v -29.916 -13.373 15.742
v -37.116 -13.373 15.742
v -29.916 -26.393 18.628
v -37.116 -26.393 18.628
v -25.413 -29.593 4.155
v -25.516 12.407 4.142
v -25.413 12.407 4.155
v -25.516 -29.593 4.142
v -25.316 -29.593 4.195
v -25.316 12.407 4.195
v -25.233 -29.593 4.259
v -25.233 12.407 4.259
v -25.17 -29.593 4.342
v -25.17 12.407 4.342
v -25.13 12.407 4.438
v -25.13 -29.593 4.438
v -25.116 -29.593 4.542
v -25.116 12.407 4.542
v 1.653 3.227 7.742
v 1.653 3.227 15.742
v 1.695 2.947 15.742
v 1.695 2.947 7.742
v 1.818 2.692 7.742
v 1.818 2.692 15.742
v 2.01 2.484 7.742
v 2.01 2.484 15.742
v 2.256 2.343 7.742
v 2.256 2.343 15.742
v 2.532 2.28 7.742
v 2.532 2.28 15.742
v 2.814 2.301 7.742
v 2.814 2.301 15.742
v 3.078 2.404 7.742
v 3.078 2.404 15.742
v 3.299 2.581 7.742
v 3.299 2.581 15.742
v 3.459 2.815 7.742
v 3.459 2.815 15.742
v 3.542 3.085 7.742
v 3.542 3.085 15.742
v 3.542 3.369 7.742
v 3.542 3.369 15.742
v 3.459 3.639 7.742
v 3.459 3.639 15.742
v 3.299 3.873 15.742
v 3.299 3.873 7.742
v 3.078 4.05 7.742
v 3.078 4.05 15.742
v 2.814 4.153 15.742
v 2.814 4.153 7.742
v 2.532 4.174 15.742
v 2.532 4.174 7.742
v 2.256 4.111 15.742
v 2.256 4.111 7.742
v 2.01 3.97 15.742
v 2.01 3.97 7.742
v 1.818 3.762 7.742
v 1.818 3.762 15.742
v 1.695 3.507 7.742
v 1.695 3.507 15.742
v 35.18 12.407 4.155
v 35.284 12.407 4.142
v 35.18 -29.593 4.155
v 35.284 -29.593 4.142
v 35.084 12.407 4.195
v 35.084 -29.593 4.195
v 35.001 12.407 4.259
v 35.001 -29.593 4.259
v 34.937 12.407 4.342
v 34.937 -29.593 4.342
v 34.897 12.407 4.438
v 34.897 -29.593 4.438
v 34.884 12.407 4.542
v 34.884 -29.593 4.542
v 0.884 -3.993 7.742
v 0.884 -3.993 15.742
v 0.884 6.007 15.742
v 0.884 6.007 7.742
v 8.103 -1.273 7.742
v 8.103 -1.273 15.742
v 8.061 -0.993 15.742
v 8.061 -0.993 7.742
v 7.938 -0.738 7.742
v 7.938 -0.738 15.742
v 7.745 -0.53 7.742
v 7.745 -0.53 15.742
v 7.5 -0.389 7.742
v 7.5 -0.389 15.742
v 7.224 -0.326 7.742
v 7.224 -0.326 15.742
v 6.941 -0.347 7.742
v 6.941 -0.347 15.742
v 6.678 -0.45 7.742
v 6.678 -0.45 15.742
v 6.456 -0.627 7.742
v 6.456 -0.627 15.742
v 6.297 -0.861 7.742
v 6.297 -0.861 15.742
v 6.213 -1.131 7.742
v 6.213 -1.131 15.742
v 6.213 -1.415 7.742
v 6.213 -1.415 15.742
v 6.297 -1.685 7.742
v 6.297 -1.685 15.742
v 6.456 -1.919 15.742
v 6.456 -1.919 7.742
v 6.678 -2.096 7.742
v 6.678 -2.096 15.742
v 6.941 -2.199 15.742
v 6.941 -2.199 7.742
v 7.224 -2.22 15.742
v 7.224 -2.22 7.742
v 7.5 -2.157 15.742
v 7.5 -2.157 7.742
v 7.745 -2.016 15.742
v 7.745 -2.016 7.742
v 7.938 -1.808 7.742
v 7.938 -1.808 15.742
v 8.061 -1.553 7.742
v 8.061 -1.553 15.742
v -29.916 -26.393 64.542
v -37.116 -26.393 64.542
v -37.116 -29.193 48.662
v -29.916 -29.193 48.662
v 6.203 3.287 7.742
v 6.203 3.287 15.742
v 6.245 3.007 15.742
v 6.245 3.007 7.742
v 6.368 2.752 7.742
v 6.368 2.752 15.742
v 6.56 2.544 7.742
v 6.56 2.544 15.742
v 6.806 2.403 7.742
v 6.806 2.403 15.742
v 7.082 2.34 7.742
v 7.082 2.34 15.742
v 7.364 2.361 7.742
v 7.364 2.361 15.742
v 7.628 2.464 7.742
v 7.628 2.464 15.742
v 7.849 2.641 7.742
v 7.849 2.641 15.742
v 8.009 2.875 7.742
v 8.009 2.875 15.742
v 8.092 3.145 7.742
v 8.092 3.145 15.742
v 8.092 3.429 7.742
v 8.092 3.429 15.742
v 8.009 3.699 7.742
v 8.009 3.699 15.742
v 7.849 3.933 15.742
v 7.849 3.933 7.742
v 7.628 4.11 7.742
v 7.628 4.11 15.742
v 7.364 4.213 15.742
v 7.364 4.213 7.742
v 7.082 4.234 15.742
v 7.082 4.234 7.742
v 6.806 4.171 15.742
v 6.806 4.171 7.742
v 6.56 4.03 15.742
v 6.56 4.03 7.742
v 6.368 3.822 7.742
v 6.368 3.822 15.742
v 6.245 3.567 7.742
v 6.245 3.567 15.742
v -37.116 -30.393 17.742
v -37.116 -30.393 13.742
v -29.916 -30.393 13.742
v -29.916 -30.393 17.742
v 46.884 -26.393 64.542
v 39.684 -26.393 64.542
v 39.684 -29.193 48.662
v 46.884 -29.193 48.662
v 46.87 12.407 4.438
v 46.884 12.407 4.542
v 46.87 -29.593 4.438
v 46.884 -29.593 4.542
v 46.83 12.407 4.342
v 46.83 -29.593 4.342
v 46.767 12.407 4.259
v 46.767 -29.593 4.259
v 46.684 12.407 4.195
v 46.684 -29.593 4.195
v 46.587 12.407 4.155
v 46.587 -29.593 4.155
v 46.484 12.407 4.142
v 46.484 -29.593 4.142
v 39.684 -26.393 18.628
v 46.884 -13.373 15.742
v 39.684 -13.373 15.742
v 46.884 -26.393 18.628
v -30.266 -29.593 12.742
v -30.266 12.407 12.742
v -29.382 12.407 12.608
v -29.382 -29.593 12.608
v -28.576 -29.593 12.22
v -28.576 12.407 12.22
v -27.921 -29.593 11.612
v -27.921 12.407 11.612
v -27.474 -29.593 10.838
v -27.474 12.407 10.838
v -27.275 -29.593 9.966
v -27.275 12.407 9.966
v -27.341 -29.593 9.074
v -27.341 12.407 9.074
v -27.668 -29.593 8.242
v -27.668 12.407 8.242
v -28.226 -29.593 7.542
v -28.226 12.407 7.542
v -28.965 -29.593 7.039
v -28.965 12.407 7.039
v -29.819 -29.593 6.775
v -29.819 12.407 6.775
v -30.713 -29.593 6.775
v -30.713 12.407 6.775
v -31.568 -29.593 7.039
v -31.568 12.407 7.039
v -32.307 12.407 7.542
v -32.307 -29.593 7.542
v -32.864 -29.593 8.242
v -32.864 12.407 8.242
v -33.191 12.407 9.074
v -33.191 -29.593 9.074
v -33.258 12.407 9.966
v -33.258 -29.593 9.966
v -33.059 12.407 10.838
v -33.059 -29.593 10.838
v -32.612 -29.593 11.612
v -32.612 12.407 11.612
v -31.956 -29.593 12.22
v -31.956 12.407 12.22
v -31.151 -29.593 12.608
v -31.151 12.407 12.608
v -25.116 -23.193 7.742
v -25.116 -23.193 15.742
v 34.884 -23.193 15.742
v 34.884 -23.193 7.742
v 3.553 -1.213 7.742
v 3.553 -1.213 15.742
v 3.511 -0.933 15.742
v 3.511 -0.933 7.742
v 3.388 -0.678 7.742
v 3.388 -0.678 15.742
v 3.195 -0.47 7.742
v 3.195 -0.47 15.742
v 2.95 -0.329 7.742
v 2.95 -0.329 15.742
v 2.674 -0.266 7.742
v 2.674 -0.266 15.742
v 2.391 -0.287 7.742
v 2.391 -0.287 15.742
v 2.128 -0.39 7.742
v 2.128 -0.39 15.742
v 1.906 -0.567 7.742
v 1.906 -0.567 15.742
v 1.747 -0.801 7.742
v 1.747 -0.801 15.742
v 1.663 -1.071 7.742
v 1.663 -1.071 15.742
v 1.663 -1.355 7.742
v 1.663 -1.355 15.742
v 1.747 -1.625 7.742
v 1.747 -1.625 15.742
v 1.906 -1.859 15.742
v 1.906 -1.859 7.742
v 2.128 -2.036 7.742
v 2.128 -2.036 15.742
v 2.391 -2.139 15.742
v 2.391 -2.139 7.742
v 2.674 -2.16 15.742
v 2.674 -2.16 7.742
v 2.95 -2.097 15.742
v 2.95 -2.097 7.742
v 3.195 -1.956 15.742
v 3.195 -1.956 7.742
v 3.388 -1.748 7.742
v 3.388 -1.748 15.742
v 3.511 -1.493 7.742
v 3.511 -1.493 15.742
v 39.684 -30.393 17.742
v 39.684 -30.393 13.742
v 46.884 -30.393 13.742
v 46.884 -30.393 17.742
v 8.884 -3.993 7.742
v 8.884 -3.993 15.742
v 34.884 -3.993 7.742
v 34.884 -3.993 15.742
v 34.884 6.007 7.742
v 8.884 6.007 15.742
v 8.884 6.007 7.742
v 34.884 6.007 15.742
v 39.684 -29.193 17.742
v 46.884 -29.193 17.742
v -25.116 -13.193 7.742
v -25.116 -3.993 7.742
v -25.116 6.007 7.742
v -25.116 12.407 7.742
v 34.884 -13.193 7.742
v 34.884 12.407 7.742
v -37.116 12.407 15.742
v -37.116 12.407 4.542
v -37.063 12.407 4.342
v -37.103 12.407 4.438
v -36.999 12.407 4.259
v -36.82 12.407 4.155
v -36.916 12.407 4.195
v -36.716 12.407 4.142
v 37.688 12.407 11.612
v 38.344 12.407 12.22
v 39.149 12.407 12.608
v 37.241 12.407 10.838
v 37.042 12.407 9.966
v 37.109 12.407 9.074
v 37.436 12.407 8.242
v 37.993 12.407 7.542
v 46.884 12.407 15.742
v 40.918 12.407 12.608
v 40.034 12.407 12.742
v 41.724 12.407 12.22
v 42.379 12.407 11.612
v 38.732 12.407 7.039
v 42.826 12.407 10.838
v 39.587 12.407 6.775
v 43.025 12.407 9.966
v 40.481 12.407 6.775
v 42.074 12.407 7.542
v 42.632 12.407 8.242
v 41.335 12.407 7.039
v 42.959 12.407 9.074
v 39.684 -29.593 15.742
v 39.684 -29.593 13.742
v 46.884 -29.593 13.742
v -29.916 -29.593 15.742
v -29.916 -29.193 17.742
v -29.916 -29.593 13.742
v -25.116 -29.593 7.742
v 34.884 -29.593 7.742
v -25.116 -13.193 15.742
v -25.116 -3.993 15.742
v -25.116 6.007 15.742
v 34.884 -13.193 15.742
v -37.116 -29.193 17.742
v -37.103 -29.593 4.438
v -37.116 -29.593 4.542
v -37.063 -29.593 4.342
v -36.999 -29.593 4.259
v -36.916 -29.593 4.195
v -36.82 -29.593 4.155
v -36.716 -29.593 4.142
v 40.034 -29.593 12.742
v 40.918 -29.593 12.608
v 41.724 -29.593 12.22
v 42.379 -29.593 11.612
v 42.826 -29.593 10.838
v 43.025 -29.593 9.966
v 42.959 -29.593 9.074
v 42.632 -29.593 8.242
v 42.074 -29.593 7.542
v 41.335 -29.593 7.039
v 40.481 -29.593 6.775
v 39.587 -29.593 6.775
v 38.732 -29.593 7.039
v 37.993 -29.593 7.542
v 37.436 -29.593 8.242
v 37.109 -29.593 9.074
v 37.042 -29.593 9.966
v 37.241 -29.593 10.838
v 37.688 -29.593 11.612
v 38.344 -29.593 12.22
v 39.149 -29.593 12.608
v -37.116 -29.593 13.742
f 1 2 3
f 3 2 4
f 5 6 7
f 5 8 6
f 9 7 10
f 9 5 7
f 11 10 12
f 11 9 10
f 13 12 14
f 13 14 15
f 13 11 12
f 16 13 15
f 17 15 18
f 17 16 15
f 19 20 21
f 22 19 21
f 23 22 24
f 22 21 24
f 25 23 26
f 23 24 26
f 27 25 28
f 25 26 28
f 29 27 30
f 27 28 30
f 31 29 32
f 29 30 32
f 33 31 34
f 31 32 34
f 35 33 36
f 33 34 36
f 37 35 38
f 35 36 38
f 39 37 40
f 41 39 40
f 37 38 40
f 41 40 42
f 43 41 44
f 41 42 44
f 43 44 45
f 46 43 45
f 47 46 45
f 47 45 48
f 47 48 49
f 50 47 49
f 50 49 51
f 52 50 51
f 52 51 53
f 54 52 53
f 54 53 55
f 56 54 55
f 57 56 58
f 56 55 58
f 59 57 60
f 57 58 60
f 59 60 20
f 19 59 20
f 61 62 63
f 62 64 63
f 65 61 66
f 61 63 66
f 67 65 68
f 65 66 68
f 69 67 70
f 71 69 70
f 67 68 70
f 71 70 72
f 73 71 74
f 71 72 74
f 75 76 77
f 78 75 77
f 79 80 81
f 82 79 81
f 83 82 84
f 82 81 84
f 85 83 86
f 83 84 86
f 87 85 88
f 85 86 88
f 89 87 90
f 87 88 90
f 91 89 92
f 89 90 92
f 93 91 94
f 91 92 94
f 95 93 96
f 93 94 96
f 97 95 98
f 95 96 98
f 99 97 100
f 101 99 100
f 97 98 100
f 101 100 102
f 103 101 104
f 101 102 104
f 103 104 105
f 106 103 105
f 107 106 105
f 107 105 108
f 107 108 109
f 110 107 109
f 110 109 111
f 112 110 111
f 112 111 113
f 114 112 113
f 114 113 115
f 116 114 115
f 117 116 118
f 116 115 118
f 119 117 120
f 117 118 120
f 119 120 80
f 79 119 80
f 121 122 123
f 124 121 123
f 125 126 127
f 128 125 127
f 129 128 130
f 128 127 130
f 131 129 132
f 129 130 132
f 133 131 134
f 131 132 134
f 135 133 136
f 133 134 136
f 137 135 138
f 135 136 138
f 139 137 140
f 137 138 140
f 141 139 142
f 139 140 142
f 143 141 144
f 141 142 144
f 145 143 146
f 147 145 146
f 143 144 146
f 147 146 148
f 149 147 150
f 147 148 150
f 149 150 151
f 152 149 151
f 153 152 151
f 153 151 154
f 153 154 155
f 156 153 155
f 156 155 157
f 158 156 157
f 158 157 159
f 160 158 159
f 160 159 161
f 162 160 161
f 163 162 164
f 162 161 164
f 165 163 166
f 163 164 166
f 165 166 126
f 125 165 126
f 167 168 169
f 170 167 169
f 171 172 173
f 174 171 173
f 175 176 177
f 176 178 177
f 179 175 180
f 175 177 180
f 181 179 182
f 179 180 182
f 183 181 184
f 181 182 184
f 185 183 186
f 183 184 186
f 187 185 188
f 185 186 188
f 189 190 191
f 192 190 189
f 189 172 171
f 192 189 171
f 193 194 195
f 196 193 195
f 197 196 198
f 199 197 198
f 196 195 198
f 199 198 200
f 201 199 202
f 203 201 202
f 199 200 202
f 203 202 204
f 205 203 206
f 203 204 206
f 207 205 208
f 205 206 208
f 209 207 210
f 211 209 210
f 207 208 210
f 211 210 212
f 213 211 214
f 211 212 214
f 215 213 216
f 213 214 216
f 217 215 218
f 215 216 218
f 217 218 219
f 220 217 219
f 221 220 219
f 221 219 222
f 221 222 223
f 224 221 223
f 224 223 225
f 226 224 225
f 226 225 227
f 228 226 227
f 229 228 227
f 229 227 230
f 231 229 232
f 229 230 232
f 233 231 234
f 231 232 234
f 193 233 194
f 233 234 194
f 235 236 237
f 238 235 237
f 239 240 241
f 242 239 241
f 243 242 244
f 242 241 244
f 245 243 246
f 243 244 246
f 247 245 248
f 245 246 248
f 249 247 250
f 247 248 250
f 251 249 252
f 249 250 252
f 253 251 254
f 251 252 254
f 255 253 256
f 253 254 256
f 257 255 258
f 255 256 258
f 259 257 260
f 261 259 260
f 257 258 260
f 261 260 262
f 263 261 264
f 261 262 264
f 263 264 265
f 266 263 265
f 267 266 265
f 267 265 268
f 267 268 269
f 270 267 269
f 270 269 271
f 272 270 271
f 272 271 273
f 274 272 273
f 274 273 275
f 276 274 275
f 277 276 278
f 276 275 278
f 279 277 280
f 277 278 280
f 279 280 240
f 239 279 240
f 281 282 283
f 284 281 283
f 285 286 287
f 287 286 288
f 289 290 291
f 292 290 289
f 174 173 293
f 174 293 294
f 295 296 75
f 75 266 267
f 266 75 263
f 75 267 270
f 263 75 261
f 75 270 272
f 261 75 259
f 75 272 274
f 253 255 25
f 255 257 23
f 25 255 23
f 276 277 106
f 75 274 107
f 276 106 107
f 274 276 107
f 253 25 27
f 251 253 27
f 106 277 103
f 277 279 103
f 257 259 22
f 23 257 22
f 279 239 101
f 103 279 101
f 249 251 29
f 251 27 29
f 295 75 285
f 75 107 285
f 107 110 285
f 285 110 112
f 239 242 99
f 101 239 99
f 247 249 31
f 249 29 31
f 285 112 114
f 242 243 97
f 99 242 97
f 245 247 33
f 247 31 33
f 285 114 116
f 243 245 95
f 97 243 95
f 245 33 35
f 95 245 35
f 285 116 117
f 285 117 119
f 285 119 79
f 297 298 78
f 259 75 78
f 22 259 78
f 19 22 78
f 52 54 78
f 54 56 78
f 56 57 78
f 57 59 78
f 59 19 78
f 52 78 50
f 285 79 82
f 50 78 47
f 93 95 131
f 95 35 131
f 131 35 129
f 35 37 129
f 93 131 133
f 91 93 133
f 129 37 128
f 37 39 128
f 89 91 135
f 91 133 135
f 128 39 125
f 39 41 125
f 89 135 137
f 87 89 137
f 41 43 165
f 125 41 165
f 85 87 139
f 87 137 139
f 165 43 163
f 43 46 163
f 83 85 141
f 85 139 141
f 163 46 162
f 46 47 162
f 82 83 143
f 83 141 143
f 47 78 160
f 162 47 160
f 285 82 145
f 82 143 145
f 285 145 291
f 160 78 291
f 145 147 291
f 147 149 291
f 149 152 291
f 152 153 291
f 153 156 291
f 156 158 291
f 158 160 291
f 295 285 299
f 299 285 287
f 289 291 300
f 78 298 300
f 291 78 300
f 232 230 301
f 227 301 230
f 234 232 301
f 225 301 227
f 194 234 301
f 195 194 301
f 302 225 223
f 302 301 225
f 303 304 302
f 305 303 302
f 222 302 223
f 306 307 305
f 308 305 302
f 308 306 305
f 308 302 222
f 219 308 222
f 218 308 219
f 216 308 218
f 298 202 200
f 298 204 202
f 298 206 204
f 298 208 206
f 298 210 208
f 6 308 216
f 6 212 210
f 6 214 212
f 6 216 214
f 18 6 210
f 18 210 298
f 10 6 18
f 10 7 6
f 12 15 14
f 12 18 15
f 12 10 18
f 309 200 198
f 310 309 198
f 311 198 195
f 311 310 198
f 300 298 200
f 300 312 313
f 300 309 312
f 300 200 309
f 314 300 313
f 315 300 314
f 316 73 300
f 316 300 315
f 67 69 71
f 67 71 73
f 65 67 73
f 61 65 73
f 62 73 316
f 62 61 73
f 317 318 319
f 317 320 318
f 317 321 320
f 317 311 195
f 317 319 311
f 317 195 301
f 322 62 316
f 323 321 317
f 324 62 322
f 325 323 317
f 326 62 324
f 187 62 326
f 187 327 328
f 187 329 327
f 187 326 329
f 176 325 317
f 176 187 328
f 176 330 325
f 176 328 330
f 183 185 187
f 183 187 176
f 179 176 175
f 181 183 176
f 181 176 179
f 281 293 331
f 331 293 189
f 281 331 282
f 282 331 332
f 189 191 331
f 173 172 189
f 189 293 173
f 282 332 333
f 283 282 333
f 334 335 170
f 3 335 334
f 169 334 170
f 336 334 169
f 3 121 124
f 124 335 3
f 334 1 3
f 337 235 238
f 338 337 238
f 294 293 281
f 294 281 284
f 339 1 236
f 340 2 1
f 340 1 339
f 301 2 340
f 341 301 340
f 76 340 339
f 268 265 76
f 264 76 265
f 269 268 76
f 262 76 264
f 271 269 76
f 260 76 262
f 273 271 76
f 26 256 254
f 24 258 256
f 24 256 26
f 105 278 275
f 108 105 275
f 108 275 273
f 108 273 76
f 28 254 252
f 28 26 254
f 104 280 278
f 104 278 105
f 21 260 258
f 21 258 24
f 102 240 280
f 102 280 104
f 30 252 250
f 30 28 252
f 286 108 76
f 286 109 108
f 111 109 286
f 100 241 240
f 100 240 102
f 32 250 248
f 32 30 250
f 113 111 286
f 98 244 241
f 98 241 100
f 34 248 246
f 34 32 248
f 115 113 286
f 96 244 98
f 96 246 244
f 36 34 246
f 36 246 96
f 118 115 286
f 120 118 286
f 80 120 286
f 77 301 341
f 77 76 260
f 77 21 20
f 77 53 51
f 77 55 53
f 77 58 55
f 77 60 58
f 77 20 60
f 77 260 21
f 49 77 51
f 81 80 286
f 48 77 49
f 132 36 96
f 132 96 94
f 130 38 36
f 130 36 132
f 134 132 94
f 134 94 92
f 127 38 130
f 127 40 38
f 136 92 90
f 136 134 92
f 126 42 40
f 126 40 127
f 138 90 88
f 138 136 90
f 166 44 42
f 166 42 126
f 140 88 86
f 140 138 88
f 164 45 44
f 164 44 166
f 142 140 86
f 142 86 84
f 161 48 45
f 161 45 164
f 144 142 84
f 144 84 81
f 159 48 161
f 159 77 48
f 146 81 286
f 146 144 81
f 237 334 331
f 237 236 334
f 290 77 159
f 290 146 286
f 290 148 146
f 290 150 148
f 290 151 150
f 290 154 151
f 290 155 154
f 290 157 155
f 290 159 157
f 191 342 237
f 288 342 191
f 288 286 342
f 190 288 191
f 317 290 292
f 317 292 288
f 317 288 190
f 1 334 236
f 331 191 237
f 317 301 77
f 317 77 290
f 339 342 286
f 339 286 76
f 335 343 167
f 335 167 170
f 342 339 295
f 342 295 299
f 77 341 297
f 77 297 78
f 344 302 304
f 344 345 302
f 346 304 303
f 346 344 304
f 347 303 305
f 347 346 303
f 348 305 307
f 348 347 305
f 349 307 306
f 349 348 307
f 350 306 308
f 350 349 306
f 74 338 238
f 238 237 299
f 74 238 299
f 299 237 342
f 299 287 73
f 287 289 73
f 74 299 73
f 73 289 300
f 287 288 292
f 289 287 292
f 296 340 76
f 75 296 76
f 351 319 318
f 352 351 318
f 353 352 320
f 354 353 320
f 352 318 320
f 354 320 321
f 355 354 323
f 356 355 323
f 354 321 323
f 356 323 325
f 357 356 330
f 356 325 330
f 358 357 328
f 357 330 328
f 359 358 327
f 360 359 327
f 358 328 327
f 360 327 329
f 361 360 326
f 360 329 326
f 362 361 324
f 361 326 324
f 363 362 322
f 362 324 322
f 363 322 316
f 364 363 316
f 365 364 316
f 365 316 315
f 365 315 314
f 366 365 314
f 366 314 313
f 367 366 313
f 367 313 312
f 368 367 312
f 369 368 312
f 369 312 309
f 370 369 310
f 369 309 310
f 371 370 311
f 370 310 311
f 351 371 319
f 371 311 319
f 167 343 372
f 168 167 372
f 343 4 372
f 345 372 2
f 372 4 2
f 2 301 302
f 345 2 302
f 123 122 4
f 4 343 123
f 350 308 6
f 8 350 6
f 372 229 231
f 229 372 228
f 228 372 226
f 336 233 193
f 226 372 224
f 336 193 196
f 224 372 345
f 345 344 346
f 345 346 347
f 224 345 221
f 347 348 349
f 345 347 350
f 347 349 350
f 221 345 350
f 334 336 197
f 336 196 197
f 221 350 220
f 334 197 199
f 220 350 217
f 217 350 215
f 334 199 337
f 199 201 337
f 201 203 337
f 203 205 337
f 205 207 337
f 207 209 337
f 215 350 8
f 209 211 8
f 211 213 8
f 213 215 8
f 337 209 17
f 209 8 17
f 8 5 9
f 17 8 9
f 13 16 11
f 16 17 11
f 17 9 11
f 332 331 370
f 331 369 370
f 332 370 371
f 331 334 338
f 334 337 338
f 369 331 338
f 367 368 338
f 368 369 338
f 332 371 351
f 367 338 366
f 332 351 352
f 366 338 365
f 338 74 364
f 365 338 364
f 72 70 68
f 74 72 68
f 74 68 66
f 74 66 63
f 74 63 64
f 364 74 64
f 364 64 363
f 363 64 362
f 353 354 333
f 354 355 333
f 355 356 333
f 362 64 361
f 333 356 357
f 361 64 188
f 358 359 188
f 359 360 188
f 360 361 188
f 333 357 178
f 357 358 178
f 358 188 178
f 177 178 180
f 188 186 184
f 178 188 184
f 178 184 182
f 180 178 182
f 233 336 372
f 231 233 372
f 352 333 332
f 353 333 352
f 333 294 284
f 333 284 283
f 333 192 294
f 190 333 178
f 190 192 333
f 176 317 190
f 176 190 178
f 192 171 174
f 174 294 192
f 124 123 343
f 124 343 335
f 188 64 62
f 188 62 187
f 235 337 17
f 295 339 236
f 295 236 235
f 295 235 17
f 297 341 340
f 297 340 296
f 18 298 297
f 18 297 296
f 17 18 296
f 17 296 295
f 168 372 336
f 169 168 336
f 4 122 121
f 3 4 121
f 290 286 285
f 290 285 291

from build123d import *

# Parameters (mm, degrees)
SKETCH1_W               = 210
SKETCH1_H               = 105
BOSS_EXTRUDE1_DEPTH     = 20
SKETCH3_W               = 18
SKETCH3_H               = 18
CUT_EXTRUDE1_DEPTH      = 5
SKETCH6_W               = 18
SKETCH6_H               = 20
BOSS_EXTRUDE2_DEPTH     = 10
SKETCH7_W               = 18
SKETCH7_H               = 7
CUT_EXTRUDE2_DEPTH      = 3
SKETCH8_W               = 18
SKETCH8_H               = 7
BOSS_EXTRUDE3_DEPTH     = 120
CUT_EXTRUDE4_DEPTH      = 261.74205403
CUT_EXTRUDE4_DEPTH_BACK = 261.74205403
SKETCH12_W              = 150
SKETCH12_H              = 25
CUT_EXTRUDE5_DEPTH      = 176.159501213
SKETCH15_W              = 30
SKETCH15_H              = 9
BOSS_EXTRUDE4_DEPTH     = 105
SKETCH16_R              = 7.5
CUT_EXTRUDE11_DEPTH     = 105
SKETCH20_W              = 20
SKETCH20_H              = 25
BOSS_EXTRUDE5_DEPTH     = 20
SKETCH21_R              = 2.375
CUT_EXTRUDE9_DEPTH      = 20
FILLET1_R               = 1
BOSS_EXTRUDE6_DEPTH     = 18
BOSS_EXTRUDE7_DEPTH     = 18
SCALE1_SCALE            = 0.4


with BuildPart() as part:
    # Sketch1 → Boss-Extrude1 (new body)
    with BuildSketch(Plane.XY):
        with Locations((4.88372093, -6.511627907)):
            Rectangle(SKETCH1_W, SKETCH1_H)
    extrude(amount=BOSS_EXTRUDE1_DEPTH)

    # Sketch3 → Cut-Extrude1 (cut)
    with BuildSketch(Plane.XY.offset(20)):
        with Locations((-91.11627907, -50.011627907)):
            Rectangle(SKETCH3_W, SKETCH3_H)
        with Locations((100.88372093, -50.011627907)):
            Rectangle(SKETCH3_W, SKETCH3_H)
    extrude(amount=-CUT_EXTRUDE1_DEPTH, mode=Mode.SUBTRACT)

    # Sketch6 → Boss-Extrude2 (add)
    with BuildSketch(Plane.XY.offset(15)):
        with Locations((-91.11627907, -51.011627907)):
            Rectangle(SKETCH6_W, SKETCH6_H)
        with Locations((100.88372093, -51.011627907)):
            Rectangle(SKETCH6_W, SKETCH6_H)
    extrude(amount=BOSS_EXTRUDE2_DEPTH)

    # Sketch7 → Cut-Extrude2 (cut)
    with BuildSketch(Plane.XY.offset(25)):
        with Locations((-91.11627907, -54.511627907)):
            Rectangle(SKETCH7_W, SKETCH7_H)
        with Locations((100.88372093, -54.511627907)):
            Rectangle(SKETCH7_W, SKETCH7_H)
    extrude(amount=-CUT_EXTRUDE2_DEPTH, mode=Mode.SUBTRACT)

    # Sketch8 → Boss-Extrude3 (add)
    with BuildSketch(Plane.XY.offset(22)):
        with Locations((-91.11627907, -54.511627907)):
            Rectangle(SKETCH8_W, SKETCH8_H)
        with Locations((100.88372093, -54.511627907)):
            Rectangle(SKETCH8_W, SKETCH8_H)
    extrude(amount=BOSS_EXTRUDE3_DEPTH)

    # Sketch9 → Cut-Extrude4 (cut, two sides: drawn at the far end of the back side and taken through both)
    with BuildSketch(Plane(origin=(109.88372093, 0, 0), x_dir=(0, 0, -1), z_dir=(1, 0, 0)).offset(-CUT_EXTRUDE4_DEPTH_BACK)):
        Polygon((-490.55895682, 10.448720548), (-142, -51.011627907), (-102.301027263, -58.011627907), (246.257929557, -119.471976362), (123.337232647, -816.589890001), (-613.479653729, -686.669193091), align=None)
    extrude(amount=CUT_EXTRUDE4_DEPTH + CUT_EXTRUDE4_DEPTH_BACK, mode=Mode.SUBTRACT)

    # Sketch12 → Cut-Extrude5 (cut, through all)
    with BuildSketch(Plane.XY.offset(20)):
        with Locations((4.88372093, 17.488372093)):
            Rectangle(SKETCH12_W, SKETCH12_H)
        with Locations((4.88372093, -30.511627907)):
            Rectangle(SKETCH12_W, SKETCH12_H)
    extrude(amount=-CUT_EXTRUDE5_DEPTH, mode=Mode.SUBTRACT)

    # Sketch15 → Boss-Extrude4 (add)
    with BuildSketch(Plane(origin=(0, 45.988372093, 0), x_dir=(1, 0, 0), z_dir=(0, 1, 0))):
        with Locations((-85.11627907, 4.5)):
            Rectangle(SKETCH15_W, SKETCH15_H)
        with Locations((94.88372093, 4.5)):
            Rectangle(SKETCH15_W, SKETCH15_H)
    extrude(amount=-BOSS_EXTRUDE4_DEPTH)

    # Sketch16 → Cut-Extrude11 (cut)
    with BuildSketch(Plane(origin=(0, 45.988372093, 0), x_dir=(1, 0, 0), z_dir=(0, 1, 0))):
        with Locations(Location((-82.99127907, -5, 0), (0, 0, 270))):
            Circle(SKETCH16_R)
        with Locations(Location((92.75872093, -5, 0), (0, 0, 270))):
            Circle(SKETCH16_R)
    extrude(amount=-CUT_EXTRUDE11_DEPTH, mode=Mode.SUBTRACT)

    # Sketch20 → Boss-Extrude5 (add)
    with BuildSketch(Plane.XY.offset(20)):
        with Locations((4.88372093, 17.488372093)):
            Rectangle(SKETCH20_W, SKETCH20_H)
    extrude(amount=-BOSS_EXTRUDE5_DEPTH)

    # Sketch21 → Cut-Extrude9 (cut)
    with BuildSketch(Plane.XY.offset(20)):
        with Locations((-0.81877907, 11.938372093)):
            Circle(SKETCH21_R)
        with Locations((10.55622093, 11.788372093)):
            Circle(SKETCH21_R)
        with Locations(Location((10.55622093, 23.188372093, 0), (0, 0, 180))):
            Circle(SKETCH21_R)
        with Locations(Location((-0.81877907, 23.038372093, 0), (0, 0, 180))):
            Circle(SKETCH21_R)
    extrude(amount=-CUT_EXTRUDE9_DEPTH, mode=Mode.SUBTRACT)

    # Fillet1
    fillet1_edges = [part.edges().sort_by_distance(p)[0] for p in [
        (-100.11627907, -6.511627907, -9),
        (-70.11627907, -6.511627907, -9),
        (109.88372093, -6.511627907, -9),
        (79.88372093, -6.511627907, -9),
    ]]
    fillet(fillet1_edges, radius=FILLET1_R)

    # Sketch23 → Boss-Extrude6 (add)
    with BuildSketch(Plane.ZY.offset(100.11627907)):
        Polygon((20, -18.461238028), (27.217256565, -51.011627907), (20, -51.011627907), align=None)
    extrude(amount=-BOSS_EXTRUDE6_DEPTH)

    # Sketch25 → Boss-Extrude7 (add)
    with BuildSketch(Plane(origin=(109.88372093, 0, 0), x_dir=(0, 0, -1), z_dir=(1, 0, 0))):
        Polygon((-20, -18.461238028), (-27.217256565, -51.011627907), (-20, -51.011627907), align=None)
    extrude(amount=-BOSS_EXTRUDE7_DEPTH)


with BuildPart() as part_1:
    # Scale1: scaled about (4.883781695, -9.980592238, 12.902521202)
    add(part.part.scale(SCALE1_SCALE).moved(Location((2.930269017, -5.988355343, 7.741512721))))


solid = part_1.part
